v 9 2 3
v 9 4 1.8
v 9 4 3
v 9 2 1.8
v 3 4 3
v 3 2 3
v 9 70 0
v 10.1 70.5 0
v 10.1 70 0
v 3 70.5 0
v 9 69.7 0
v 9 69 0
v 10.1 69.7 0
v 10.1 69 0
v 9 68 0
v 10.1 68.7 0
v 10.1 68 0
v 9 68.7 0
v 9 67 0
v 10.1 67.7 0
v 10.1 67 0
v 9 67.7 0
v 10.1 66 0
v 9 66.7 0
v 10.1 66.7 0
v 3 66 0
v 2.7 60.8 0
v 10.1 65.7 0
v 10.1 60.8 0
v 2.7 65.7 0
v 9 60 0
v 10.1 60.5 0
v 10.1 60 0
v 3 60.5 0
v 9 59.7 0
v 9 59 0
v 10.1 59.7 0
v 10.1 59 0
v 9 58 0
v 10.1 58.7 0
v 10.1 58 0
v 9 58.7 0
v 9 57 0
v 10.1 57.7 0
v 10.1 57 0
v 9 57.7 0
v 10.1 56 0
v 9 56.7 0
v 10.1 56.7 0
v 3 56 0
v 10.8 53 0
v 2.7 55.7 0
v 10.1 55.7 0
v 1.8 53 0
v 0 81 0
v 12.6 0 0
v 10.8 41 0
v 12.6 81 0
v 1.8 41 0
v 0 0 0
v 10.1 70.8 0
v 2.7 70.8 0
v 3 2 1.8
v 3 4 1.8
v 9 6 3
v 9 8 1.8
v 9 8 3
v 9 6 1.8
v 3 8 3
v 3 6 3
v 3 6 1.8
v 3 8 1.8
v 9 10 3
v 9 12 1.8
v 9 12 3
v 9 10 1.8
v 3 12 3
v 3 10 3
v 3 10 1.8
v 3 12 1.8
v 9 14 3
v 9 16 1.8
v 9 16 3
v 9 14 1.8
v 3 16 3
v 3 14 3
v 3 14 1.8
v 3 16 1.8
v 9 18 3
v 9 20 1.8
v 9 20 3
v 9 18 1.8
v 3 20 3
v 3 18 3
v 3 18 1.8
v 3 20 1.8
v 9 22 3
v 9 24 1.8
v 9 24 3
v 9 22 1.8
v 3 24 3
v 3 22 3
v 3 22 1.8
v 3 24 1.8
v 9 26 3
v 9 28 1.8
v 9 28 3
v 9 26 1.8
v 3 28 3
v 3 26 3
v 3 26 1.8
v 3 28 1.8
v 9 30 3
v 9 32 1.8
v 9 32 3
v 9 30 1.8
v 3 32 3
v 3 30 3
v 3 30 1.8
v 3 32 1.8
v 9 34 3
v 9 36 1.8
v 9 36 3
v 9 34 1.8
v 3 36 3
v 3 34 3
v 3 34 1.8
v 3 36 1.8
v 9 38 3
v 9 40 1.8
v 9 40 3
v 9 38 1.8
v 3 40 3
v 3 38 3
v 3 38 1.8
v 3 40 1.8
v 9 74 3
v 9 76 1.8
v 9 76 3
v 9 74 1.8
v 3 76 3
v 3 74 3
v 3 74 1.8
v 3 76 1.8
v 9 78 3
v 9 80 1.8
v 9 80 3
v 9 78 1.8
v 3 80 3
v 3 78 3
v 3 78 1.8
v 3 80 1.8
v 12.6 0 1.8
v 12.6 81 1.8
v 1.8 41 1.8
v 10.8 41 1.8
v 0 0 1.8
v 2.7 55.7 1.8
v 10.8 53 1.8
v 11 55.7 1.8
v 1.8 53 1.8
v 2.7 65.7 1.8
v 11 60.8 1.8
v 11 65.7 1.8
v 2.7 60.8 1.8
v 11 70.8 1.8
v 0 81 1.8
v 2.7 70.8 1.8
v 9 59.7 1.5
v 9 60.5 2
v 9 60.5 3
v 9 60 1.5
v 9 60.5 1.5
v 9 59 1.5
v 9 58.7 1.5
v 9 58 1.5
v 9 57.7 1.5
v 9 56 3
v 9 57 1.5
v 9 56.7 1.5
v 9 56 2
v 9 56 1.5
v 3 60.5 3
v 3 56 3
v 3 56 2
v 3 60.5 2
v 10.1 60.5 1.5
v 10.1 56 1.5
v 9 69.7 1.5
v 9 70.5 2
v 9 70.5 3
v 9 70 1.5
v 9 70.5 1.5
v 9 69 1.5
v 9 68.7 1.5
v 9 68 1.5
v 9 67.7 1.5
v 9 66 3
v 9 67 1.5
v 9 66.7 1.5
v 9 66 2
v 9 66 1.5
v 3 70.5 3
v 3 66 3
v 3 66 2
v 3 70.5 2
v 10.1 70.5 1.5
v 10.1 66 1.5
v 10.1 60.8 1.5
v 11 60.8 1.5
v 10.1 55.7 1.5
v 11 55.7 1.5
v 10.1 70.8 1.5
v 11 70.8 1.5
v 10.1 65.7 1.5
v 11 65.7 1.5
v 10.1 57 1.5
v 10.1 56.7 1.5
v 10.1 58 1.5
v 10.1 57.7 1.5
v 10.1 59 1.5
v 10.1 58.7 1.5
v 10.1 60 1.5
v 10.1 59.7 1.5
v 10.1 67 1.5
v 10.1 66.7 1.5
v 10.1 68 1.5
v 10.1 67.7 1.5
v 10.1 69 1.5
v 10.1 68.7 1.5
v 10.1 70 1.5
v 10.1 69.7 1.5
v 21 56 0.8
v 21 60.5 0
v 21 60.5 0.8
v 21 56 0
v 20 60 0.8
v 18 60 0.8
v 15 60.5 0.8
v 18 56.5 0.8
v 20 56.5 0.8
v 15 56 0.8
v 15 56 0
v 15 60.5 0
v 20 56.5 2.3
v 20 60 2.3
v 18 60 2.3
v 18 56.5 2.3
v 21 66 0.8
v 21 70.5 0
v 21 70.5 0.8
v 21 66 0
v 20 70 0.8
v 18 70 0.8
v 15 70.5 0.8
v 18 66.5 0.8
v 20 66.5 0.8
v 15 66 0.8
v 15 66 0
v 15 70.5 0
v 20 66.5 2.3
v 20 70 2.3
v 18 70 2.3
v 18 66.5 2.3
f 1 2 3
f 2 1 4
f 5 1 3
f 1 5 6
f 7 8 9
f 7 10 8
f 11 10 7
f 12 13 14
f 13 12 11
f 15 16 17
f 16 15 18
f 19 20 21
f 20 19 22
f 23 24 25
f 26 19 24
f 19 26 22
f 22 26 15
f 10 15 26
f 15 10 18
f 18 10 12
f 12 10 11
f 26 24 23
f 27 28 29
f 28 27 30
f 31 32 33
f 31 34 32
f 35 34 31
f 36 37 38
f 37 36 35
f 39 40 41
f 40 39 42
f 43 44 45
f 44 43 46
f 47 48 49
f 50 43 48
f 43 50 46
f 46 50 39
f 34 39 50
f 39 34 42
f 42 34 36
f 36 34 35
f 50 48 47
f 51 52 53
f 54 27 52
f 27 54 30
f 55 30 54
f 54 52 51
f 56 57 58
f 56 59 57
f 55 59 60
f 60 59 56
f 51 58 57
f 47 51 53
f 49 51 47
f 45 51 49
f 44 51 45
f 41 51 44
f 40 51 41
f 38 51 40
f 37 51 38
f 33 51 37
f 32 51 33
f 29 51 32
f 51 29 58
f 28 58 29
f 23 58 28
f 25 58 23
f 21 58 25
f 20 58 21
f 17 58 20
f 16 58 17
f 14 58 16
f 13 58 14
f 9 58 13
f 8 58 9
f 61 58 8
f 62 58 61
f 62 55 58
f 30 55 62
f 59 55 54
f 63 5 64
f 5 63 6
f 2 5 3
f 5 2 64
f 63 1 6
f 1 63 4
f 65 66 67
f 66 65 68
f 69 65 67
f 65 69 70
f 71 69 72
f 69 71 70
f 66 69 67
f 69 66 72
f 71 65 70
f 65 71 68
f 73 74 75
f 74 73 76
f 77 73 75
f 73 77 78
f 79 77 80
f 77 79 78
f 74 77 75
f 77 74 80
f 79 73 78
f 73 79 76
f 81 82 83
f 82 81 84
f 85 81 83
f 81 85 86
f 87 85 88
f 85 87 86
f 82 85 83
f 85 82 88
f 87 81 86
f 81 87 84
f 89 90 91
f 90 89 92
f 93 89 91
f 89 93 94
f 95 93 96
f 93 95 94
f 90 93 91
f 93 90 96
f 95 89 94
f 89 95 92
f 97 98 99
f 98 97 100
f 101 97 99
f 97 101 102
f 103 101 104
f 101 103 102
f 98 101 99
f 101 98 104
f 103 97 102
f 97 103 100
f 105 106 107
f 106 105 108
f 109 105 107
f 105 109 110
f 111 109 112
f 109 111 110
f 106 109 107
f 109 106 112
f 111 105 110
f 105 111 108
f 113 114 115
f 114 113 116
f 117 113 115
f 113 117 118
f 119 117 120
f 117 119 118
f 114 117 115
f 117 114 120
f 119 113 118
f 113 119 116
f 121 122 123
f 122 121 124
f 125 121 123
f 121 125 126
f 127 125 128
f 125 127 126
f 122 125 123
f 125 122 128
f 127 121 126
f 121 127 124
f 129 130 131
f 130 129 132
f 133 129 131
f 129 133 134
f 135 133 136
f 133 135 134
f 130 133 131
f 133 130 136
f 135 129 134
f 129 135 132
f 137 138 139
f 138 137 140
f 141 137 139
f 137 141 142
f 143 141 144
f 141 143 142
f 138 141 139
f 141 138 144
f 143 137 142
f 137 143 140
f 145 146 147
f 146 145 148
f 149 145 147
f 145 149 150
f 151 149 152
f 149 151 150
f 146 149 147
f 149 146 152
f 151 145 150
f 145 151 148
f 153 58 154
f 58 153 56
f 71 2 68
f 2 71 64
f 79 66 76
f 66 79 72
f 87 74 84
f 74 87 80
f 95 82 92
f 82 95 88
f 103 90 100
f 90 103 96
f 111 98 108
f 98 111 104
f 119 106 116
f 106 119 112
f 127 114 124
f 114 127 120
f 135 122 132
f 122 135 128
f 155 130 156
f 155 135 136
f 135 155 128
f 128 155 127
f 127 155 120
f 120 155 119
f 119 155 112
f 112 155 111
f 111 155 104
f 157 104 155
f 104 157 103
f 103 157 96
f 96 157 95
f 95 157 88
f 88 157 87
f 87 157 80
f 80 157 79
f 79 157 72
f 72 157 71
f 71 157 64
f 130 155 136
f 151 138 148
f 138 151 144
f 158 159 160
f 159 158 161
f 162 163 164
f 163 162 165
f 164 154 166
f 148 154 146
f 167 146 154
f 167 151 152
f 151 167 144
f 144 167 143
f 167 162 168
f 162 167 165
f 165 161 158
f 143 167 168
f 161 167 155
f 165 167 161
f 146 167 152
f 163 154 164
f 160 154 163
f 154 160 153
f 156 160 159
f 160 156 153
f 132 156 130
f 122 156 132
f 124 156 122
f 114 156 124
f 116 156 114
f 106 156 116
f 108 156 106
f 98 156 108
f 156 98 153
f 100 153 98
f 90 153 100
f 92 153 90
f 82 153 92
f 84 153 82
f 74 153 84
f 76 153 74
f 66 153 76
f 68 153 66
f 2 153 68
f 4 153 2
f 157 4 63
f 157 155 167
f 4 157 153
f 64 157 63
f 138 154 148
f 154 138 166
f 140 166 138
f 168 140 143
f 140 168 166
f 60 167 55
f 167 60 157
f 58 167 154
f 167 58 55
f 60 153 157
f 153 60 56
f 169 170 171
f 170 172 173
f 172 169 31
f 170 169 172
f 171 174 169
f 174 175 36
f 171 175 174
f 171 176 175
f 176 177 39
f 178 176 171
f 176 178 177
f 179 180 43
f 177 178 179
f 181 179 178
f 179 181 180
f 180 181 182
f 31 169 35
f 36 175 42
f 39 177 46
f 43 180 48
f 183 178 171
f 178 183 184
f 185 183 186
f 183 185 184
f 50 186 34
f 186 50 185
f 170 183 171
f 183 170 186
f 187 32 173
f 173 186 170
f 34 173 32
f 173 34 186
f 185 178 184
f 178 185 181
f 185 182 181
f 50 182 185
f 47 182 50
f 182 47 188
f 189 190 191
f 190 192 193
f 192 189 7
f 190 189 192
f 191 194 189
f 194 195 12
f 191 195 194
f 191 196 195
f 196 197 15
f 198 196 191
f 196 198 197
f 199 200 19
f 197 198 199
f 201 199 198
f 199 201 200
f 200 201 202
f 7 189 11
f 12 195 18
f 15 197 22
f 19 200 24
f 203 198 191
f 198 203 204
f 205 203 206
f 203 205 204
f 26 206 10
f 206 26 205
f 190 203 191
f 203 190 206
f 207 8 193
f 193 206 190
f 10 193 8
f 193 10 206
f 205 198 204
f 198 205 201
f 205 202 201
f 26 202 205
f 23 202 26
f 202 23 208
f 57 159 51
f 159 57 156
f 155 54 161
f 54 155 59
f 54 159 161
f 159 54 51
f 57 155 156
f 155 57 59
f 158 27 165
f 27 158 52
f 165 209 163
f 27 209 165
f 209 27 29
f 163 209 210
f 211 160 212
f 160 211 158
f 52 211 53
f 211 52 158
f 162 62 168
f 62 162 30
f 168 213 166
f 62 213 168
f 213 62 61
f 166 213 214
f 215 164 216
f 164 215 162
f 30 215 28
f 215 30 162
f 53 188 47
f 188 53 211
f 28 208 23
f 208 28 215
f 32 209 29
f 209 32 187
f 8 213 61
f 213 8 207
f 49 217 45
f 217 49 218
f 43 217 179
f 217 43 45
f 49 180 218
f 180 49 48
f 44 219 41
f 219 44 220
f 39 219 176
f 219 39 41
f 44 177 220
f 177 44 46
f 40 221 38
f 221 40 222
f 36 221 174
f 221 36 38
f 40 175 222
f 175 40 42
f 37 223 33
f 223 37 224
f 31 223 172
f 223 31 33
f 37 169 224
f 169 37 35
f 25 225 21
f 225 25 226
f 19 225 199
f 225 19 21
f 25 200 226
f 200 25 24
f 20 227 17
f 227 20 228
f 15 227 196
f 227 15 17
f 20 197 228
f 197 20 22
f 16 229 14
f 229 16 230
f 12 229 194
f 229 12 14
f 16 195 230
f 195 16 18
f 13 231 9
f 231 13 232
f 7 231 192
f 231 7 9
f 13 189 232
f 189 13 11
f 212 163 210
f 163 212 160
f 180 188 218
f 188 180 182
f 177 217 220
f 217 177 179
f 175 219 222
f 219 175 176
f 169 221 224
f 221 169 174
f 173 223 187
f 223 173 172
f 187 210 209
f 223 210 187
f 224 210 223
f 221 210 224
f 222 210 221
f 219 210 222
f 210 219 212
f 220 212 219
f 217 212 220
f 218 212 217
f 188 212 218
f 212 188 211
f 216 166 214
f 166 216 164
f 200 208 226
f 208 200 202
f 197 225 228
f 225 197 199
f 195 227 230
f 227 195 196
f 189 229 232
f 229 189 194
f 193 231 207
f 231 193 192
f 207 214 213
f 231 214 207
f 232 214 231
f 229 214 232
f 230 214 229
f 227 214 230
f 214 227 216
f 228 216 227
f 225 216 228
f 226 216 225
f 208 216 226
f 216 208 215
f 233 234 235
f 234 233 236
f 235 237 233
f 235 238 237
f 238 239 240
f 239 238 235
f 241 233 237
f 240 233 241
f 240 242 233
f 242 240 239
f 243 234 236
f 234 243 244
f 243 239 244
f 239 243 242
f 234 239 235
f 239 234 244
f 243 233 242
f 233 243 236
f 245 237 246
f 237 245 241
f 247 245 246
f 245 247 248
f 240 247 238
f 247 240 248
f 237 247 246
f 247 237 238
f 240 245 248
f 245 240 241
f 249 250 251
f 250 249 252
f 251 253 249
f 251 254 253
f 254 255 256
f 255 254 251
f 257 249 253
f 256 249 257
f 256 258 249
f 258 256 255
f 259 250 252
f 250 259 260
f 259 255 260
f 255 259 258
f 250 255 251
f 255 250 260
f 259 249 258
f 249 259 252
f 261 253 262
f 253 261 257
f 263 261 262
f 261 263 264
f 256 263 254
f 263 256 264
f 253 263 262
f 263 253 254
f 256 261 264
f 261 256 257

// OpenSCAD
module  plate() {
    difference() {
        union() {
            cube([12.6, 81.0, 1.8]);
            for(dy=[2.0: 4.0: 40.0]) {
                translate([3.0, dy, 0.0]) 
                cube([6.0, 2.0, 3.0]);
            }
            for(dy=[74.0: 4.0: 78.0]) {
                translate([3.0, dy, 0.0]) 
                cube([6.0, 2.0, 3.0]);
            }
            translate([3.0, 56, 0.0]) cube([6.0, 4.5, 3.0]);
            translate([3.0, 66, 0.0]) cube([6.0, 4.5, 3.0]);
        }
        translate([1.8, 41, -1.0]) cube([9.0, 12.0, 3.0]);
        translate([2.7, 55.7, -1.0]) cube([0.3, 5.1, 3.0]);
        translate([2.7, 65.7, -1.0]) cube([0.3, 5.1, 3.0]);
        translate([2.7, 55.7, -1.0]) cube([7.4, 0.3, 3.0]);
        translate([2.7, 65.7, -1.0]) cube([7.4, 0.3, 3.0]);
        translate([2.7, 60.5, -1.0]) cube([7.4, 0.3, 3.0]);
        translate([2.7, 70.5, -1.0]) cube([7.4, 0.3, 3.0]);
        translate([9.0, 56.7, -1.0]) cube([1.1, 0.3, 3.0]);
        translate([9.0, 57.7, -1.0]) cube([1.1, 0.3, 3.0]);
        translate([9.0, 58.7, -1.0]) cube([1.1, 0.3, 3.0]);
        translate([9.0, 59.7, -1.0]) cube([1.1, 0.3, 3.0]);
        translate([9.0, 66.7, -1.0]) cube([1.1, 0.3, 3.0]);
        translate([9.0, 67.7, -1.0]) cube([1.1, 0.3, 3.0]);
        translate([9.0, 68.7, -1.0]) cube([1.1, 0.3, 3.0]);
        translate([9.0, 69.7, -1.0]) cube([1.1, 0.3, 3.0]);
        translate([9.0, 55.7, 1.5]) cube([2.0, 5.1, 3.0]);
        translate([9.0, 65.7, 1.5]) cube([2.0, 5.1, 3.0]);
    }
}

module button() {
    cube([6.0, 4.5, 0.8]);
    translate([3.0, 0.5, 0.0]) cube([2.0, 3.5, 2.3]);
}

plate();
translate([15.0, 56.0, 0.0]) button();
translate([15.0, 66.0, 0.0]) button();
